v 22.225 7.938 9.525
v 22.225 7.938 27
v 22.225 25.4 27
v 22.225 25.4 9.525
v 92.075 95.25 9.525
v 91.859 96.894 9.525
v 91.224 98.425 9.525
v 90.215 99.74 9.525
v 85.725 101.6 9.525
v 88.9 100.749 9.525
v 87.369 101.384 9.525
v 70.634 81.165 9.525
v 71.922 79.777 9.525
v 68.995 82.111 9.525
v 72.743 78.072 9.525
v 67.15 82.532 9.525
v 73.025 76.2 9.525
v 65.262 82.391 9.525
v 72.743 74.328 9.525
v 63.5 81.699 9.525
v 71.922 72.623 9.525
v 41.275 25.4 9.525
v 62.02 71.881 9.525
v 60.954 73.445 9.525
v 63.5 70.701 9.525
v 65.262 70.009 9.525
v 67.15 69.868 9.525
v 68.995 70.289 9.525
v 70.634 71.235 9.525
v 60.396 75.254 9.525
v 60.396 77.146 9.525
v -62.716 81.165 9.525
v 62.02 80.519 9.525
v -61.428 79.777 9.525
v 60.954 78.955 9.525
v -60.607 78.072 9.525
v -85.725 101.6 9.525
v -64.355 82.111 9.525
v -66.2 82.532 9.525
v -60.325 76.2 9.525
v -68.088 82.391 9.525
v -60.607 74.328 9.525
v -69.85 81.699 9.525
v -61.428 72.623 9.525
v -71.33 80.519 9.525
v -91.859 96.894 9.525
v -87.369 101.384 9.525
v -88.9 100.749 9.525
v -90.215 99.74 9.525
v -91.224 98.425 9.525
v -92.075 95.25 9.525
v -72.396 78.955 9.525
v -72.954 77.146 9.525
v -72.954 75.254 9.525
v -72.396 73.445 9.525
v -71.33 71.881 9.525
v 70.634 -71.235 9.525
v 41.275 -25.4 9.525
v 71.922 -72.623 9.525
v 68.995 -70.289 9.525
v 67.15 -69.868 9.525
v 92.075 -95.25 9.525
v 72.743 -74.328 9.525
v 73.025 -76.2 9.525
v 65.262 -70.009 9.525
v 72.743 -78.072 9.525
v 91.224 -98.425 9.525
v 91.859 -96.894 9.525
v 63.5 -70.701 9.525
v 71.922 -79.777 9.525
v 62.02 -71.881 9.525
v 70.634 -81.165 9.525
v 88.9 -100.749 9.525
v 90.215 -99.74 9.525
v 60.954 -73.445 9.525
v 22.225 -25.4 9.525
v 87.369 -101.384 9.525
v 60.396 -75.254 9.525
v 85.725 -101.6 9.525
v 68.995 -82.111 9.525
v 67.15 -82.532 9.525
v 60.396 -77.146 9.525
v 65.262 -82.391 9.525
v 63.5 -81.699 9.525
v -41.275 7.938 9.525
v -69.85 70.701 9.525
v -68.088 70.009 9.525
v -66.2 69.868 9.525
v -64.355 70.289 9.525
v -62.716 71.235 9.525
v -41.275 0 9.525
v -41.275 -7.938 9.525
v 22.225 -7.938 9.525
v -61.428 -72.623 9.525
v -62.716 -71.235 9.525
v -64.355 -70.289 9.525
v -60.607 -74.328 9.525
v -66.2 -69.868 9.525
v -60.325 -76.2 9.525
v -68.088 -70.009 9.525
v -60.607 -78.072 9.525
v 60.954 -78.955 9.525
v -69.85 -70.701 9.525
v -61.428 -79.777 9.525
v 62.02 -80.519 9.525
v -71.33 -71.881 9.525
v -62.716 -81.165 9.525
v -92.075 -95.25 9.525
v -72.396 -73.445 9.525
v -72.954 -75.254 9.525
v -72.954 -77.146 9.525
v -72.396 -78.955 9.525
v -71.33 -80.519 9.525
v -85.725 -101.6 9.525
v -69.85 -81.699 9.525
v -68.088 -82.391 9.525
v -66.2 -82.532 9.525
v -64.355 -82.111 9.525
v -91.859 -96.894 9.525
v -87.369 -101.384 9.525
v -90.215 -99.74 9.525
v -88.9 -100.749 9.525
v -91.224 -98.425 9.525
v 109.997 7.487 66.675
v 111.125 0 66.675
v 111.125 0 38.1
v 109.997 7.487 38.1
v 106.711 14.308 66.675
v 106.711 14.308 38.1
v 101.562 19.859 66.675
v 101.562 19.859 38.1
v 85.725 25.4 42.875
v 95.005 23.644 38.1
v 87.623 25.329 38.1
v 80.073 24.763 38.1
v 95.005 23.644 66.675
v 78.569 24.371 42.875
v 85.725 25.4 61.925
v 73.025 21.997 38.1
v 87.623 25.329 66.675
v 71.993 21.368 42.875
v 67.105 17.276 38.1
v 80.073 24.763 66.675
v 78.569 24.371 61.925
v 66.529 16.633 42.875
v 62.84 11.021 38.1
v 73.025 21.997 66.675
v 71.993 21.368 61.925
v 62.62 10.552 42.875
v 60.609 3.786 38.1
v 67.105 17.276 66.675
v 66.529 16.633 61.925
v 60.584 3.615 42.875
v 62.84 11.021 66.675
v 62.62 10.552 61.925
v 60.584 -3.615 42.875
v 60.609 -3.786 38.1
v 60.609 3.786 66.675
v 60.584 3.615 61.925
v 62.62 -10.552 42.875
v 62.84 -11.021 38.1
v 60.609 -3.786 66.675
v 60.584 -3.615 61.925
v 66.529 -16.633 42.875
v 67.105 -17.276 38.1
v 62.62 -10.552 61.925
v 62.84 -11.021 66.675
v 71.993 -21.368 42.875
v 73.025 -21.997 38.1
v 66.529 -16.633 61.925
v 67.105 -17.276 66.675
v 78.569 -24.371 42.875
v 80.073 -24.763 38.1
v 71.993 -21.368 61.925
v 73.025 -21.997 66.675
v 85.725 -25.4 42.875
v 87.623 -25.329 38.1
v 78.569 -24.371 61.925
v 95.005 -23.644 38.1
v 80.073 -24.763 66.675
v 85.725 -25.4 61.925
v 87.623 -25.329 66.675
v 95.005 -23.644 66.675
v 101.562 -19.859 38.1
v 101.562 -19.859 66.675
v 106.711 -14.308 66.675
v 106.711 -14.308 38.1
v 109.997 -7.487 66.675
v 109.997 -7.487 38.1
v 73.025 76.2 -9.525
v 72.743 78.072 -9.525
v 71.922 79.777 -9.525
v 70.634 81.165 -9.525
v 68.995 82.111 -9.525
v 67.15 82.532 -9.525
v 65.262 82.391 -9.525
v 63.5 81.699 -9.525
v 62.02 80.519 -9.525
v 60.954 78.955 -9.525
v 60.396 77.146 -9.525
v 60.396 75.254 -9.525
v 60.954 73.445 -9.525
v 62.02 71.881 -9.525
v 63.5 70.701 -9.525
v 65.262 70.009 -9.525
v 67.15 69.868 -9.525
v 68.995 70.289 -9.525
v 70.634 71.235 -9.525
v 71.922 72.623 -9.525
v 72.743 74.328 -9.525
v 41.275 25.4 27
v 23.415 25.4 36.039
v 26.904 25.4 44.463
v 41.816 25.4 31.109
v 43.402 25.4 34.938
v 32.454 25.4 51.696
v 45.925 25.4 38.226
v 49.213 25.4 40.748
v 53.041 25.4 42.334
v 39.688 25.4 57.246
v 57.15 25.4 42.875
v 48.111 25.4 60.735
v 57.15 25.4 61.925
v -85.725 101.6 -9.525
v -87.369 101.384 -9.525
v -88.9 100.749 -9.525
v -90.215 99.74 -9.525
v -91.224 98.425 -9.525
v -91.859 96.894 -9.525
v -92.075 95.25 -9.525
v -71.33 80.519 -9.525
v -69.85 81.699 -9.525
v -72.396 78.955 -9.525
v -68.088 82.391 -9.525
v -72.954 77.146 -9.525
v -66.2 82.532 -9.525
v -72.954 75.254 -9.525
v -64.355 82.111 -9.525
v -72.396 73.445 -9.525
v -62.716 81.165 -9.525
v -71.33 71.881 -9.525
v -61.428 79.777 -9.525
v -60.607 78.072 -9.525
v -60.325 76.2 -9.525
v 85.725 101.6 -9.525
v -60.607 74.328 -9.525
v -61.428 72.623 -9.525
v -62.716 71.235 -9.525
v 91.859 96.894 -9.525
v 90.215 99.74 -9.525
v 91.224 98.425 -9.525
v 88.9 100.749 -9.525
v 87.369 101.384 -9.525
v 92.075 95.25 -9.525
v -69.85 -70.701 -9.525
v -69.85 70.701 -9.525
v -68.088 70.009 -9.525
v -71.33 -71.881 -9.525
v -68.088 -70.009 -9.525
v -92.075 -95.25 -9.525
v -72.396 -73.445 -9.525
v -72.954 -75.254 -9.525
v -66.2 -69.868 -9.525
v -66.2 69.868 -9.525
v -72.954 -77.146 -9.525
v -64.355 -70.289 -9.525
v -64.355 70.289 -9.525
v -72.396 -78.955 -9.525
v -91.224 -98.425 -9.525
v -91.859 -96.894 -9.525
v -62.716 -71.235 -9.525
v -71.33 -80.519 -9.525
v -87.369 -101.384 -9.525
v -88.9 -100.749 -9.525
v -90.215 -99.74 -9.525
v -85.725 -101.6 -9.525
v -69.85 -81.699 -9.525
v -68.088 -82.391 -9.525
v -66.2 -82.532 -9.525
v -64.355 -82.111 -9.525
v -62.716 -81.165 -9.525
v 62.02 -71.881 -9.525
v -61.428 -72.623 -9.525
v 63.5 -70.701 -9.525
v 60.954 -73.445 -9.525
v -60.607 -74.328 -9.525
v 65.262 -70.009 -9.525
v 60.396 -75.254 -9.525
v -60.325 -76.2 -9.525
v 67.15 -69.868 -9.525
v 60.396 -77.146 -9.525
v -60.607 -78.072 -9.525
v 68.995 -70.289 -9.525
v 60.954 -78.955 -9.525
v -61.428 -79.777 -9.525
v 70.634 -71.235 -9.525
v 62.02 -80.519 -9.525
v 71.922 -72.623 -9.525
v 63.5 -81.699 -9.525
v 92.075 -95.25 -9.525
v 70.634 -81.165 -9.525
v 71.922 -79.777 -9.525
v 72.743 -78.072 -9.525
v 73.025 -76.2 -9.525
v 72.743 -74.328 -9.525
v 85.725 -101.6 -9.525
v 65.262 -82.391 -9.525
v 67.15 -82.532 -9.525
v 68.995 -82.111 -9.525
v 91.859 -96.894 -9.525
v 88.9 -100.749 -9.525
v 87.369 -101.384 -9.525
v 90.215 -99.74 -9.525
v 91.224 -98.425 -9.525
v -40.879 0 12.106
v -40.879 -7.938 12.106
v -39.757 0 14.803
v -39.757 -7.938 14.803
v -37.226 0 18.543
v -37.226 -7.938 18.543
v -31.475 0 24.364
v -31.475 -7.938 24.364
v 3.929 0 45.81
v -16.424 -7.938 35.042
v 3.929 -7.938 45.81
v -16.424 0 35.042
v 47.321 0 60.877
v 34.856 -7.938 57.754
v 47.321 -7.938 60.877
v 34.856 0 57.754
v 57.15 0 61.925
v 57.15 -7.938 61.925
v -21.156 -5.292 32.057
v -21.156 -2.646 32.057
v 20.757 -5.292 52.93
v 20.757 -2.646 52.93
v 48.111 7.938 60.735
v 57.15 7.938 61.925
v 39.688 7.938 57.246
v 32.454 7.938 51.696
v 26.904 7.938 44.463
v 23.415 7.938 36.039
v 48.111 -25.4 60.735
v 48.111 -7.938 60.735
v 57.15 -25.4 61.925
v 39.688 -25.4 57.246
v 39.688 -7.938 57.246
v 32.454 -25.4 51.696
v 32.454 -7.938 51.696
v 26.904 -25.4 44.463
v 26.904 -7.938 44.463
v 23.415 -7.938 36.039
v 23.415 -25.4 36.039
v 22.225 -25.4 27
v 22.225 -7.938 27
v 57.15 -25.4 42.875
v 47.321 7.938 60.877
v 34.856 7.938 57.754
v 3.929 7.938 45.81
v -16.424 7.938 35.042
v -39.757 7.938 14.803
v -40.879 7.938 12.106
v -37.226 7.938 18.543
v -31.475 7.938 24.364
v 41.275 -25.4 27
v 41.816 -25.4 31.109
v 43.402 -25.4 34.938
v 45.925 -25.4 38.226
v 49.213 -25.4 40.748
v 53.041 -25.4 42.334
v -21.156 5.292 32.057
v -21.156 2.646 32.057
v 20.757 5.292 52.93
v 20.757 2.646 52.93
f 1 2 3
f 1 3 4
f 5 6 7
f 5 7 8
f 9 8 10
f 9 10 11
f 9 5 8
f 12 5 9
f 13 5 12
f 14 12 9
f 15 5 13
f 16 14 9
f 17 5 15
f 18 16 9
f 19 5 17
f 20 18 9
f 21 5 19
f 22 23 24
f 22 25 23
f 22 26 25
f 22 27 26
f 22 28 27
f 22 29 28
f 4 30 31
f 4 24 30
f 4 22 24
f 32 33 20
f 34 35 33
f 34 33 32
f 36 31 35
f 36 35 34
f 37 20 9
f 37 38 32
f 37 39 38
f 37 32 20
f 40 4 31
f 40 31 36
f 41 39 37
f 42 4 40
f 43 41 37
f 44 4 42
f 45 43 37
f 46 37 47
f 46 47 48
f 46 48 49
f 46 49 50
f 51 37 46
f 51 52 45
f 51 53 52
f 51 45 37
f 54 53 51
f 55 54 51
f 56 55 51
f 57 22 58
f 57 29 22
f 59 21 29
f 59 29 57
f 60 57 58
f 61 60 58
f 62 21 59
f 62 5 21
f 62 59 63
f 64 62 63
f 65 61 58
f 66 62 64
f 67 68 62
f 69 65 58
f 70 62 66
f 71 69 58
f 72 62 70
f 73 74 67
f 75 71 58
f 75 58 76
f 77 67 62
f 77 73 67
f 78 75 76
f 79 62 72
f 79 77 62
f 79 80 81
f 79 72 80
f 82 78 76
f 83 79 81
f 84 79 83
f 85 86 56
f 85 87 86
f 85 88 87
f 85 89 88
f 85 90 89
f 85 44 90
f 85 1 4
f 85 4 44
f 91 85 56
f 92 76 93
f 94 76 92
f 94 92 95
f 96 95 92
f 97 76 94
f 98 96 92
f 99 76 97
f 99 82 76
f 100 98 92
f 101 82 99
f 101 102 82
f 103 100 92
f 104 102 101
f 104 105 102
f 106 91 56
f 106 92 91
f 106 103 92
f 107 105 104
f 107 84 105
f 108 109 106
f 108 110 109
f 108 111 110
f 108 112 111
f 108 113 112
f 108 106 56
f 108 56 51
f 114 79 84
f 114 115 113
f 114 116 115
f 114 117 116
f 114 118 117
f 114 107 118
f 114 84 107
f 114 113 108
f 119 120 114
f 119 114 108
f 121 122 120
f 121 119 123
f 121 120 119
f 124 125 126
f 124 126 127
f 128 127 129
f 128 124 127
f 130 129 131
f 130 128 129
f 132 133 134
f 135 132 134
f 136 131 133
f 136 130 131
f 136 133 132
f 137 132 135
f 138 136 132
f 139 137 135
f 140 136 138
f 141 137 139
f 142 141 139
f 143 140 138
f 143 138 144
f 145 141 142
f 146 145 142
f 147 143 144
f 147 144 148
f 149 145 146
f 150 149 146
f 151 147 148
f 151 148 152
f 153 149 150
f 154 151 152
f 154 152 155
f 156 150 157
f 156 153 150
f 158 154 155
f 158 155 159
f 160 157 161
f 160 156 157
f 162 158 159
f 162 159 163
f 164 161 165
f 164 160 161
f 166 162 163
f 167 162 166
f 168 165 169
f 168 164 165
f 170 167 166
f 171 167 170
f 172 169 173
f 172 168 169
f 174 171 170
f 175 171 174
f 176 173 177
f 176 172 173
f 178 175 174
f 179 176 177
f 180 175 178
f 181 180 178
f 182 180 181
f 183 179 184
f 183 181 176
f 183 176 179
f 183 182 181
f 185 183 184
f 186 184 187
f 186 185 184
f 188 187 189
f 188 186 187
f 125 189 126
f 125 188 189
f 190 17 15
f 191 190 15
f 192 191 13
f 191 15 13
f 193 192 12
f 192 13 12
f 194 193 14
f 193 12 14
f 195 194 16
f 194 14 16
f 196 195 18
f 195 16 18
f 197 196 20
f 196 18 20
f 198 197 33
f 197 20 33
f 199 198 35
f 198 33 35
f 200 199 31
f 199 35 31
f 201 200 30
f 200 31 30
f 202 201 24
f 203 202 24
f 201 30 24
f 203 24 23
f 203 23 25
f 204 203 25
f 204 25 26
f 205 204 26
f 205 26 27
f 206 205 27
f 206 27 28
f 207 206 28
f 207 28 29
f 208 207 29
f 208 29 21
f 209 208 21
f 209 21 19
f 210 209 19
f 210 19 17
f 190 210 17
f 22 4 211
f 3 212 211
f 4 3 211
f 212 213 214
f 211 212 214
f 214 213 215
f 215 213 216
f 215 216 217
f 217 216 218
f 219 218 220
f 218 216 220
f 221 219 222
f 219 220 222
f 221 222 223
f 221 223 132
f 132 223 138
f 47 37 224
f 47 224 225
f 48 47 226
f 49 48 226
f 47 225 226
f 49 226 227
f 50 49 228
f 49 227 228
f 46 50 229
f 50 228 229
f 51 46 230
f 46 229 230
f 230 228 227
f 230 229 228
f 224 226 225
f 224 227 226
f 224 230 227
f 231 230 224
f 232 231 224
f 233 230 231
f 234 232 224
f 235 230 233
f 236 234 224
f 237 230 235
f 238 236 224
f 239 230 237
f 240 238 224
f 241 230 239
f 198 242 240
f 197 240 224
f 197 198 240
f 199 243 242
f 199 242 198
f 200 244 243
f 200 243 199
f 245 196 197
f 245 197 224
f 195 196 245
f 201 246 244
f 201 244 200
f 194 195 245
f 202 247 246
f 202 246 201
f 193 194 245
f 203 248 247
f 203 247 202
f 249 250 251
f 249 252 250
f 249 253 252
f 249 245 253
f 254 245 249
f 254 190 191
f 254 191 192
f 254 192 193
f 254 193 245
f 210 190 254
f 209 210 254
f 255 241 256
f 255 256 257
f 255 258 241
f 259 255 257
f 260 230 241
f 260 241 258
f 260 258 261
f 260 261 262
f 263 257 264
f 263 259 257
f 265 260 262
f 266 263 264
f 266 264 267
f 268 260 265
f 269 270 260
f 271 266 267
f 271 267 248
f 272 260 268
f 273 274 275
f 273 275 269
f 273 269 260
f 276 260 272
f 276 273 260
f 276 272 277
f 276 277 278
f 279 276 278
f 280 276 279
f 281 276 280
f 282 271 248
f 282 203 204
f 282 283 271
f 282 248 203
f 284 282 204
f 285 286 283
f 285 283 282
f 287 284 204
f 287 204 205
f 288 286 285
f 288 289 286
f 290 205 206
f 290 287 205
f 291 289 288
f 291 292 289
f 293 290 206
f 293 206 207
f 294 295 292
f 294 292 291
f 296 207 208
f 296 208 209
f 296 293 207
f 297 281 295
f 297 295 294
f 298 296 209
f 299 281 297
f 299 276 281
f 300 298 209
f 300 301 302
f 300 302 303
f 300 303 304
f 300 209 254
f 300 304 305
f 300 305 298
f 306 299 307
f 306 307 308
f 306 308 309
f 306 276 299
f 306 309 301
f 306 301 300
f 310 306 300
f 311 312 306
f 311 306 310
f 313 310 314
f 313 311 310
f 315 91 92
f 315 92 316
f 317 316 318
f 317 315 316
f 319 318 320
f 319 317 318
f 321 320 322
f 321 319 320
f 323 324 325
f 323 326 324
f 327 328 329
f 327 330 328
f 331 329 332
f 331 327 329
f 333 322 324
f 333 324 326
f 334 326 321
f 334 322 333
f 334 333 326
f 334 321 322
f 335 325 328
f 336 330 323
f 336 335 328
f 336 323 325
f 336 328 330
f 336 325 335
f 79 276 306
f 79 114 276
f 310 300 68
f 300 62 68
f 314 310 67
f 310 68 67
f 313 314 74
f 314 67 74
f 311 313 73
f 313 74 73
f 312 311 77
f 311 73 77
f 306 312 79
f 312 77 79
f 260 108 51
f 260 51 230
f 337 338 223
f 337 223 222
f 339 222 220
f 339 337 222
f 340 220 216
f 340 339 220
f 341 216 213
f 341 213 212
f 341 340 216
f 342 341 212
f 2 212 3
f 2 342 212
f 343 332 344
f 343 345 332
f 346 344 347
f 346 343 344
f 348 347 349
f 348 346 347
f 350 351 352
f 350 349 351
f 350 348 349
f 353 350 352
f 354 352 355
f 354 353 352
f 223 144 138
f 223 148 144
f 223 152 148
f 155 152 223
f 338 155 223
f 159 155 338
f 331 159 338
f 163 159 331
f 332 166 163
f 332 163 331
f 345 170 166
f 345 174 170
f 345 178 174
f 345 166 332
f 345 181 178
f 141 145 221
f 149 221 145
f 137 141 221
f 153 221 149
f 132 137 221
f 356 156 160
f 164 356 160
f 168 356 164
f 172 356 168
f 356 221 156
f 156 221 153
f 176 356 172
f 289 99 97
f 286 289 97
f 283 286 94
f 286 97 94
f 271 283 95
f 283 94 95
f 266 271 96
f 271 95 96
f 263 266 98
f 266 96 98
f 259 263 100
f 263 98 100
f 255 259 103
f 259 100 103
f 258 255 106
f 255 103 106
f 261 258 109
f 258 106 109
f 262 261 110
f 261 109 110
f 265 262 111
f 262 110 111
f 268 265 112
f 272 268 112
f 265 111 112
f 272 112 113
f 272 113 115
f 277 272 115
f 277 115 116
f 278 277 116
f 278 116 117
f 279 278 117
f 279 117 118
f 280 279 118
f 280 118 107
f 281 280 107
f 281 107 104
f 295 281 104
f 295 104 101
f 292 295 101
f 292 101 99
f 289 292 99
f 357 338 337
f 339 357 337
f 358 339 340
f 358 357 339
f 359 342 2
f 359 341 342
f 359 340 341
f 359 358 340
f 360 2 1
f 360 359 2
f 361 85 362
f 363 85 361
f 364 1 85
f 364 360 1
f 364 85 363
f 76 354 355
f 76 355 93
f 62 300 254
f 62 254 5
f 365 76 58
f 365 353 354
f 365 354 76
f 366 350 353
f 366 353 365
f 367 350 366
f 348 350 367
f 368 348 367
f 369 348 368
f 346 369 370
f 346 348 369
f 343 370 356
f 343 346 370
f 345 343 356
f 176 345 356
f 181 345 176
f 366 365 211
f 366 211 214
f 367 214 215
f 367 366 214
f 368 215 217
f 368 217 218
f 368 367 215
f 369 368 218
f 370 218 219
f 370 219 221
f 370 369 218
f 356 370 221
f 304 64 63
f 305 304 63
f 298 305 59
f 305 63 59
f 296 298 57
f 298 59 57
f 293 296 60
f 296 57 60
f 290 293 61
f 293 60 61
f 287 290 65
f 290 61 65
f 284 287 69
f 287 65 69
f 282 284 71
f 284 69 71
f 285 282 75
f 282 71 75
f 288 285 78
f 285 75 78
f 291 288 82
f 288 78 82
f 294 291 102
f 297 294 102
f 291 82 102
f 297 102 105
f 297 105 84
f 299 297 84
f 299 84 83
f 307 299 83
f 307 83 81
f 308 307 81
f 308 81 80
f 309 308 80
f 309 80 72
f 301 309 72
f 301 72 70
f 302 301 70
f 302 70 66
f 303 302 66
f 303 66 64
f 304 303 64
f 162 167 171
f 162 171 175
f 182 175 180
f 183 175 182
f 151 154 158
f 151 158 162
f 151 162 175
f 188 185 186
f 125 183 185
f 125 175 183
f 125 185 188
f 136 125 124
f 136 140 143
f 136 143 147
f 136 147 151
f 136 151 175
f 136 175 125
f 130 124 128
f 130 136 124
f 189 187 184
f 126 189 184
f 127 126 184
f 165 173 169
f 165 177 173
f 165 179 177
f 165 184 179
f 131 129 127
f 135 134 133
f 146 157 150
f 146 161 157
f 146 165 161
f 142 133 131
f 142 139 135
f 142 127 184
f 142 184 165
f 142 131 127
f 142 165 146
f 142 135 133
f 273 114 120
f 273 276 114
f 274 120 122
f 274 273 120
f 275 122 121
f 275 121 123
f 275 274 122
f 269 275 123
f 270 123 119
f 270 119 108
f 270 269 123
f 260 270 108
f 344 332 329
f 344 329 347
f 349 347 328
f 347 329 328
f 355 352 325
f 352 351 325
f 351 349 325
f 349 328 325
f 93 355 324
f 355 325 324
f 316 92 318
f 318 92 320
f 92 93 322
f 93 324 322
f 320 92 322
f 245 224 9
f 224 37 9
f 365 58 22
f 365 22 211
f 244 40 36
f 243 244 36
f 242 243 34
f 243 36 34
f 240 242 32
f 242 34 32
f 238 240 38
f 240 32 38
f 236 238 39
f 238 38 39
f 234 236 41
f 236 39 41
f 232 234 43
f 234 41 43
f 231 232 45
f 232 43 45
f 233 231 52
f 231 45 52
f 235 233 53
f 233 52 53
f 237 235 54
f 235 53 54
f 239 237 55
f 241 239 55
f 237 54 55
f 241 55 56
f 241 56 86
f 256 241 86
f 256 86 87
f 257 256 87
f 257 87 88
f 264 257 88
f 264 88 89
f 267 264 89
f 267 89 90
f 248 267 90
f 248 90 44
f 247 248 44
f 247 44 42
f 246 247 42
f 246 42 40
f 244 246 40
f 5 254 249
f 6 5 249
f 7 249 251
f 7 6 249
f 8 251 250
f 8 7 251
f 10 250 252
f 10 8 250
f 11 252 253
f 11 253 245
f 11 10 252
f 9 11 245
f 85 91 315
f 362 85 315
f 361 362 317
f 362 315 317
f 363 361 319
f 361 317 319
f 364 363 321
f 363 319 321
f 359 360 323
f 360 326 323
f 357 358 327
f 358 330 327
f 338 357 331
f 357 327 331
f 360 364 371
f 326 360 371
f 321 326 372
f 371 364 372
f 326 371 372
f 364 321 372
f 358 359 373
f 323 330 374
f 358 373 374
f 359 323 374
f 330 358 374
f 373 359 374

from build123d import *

# Parameters (mm, degrees)
F1_DEPTH = 101.6
F0_W     = 25.4
F0_H     = 19.05
F2_DEPTH = 25.4
F3_DEPTH = 7.9375
F5_R     = 6.35
F6_R     = 6.35
F7_DEPTH = 19.051


# Not quite as in the source:
# - a feature names something its author has since deleted; it is built from what else it names


with BuildPart() as f1:
    # F0 (on Front) → F1 (new body, symmetric)
    with BuildSketch(Plane.XZ):
        Polygon((-92.075, -9.525), (-41.275, -9.525), (41.275, -9.525), (92.075, -9.525), (92.075, 9.525), (41.275, 9.525), (22.225, 9.525), (-41.275, 9.525), (-92.075, 9.525), align=None)
    extrude(amount=F1_DEPTH, both=True)

    # F0 (on Front) → F2 (join, symmetric)
    with BuildSketch(Plane.XZ):
        with BuildLine():
            Line((22.225, 9.525), (41.275, 9.525))
            Line((41.275, 9.525), (41.275, 27.0002))
            ThreePointArc((41.275, 27.0002), (45.9246798487, 38.2255201513), (57.15, 42.8752))
            Line((57.15, 42.8752), (60.325, 42.8752))
            Line((60.325, 42.8752), (60.325, 61.9252))
            Line((60.325, 61.9252), (57.15, 61.9252))
            ThreePointArc((57.15, 61.9252), (32.4542956671, 51.6959043329), (22.225, 27.0002))
            Line((22.225, 27.0002), (22.225, 9.525))
        make_face()
        with Locations((73.025, 52.4002)):
            Rectangle(F0_W, F0_H)
    extrude(amount=F2_DEPTH, both=True)

    # F0 (on Front) → F3 (join, symmetric)
    with BuildSketch(Plane.XZ):
        with BuildLine():
            add(Edge.make_bspline(
                [(-41.275, 9.525), (-41.1597527564, 29.4812973589), (32.6236560941, 62.2739233077), (57.15, 61.9252)],
                knots=[0, 0, 0, 0, 111.5045361635, 111.5045361635, 111.5045361635, 111.5045361635], degree=3))
            Line((-41.275, 9.525), (22.225, 9.525))
            Line((22.225, 9.525), (22.225, 27.0002))
            ThreePointArc((22.225, 27.0002), (32.4542956671, 51.6959043329), (57.15, 61.9252))
        make_face()
    extrude(amount=F3_DEPTH, both=True)

    # F0 (on Front) → F4 (revolve)
    with BuildSketch(Plane.XZ):
        Polygon((85.725, 66.675), (85.725, 61.9252), (85.725, 42.8752), (85.725, 38.1), (111.125, 38.1), (111.125, 66.675), align=None)
    revolve(axis=Axis((85.725, 0, 52.3875), (0, 0, 1)))

    # F5
    f5_edges = [f1.edges().sort_by_distance(p)[0] for p in [
        (-92.075, -101.6, 0),
        (92.075, -101.6, 0),
        (92.075, 101.6, 0),
        (-92.075, 101.6, 0),
    ]]
    fillet(f5_edges, radius=F5_R)

    # F6 (on face) → F7 (cut, through all)
    with BuildSketch(Plane.XY.offset(9.525)):
        with Locations((66.675, 76.2)):
            Circle(F6_R)
        with Locations((66.675, -76.2)):
            Circle(F6_R)
        with Locations((-66.675, 76.2)):
            Circle(F6_R)
        with Locations((-66.675, -76.2)):
            Circle(F6_R)
    extrude(amount=-F7_DEPTH, mode=Mode.SUBTRACT)


solid = f1.part
